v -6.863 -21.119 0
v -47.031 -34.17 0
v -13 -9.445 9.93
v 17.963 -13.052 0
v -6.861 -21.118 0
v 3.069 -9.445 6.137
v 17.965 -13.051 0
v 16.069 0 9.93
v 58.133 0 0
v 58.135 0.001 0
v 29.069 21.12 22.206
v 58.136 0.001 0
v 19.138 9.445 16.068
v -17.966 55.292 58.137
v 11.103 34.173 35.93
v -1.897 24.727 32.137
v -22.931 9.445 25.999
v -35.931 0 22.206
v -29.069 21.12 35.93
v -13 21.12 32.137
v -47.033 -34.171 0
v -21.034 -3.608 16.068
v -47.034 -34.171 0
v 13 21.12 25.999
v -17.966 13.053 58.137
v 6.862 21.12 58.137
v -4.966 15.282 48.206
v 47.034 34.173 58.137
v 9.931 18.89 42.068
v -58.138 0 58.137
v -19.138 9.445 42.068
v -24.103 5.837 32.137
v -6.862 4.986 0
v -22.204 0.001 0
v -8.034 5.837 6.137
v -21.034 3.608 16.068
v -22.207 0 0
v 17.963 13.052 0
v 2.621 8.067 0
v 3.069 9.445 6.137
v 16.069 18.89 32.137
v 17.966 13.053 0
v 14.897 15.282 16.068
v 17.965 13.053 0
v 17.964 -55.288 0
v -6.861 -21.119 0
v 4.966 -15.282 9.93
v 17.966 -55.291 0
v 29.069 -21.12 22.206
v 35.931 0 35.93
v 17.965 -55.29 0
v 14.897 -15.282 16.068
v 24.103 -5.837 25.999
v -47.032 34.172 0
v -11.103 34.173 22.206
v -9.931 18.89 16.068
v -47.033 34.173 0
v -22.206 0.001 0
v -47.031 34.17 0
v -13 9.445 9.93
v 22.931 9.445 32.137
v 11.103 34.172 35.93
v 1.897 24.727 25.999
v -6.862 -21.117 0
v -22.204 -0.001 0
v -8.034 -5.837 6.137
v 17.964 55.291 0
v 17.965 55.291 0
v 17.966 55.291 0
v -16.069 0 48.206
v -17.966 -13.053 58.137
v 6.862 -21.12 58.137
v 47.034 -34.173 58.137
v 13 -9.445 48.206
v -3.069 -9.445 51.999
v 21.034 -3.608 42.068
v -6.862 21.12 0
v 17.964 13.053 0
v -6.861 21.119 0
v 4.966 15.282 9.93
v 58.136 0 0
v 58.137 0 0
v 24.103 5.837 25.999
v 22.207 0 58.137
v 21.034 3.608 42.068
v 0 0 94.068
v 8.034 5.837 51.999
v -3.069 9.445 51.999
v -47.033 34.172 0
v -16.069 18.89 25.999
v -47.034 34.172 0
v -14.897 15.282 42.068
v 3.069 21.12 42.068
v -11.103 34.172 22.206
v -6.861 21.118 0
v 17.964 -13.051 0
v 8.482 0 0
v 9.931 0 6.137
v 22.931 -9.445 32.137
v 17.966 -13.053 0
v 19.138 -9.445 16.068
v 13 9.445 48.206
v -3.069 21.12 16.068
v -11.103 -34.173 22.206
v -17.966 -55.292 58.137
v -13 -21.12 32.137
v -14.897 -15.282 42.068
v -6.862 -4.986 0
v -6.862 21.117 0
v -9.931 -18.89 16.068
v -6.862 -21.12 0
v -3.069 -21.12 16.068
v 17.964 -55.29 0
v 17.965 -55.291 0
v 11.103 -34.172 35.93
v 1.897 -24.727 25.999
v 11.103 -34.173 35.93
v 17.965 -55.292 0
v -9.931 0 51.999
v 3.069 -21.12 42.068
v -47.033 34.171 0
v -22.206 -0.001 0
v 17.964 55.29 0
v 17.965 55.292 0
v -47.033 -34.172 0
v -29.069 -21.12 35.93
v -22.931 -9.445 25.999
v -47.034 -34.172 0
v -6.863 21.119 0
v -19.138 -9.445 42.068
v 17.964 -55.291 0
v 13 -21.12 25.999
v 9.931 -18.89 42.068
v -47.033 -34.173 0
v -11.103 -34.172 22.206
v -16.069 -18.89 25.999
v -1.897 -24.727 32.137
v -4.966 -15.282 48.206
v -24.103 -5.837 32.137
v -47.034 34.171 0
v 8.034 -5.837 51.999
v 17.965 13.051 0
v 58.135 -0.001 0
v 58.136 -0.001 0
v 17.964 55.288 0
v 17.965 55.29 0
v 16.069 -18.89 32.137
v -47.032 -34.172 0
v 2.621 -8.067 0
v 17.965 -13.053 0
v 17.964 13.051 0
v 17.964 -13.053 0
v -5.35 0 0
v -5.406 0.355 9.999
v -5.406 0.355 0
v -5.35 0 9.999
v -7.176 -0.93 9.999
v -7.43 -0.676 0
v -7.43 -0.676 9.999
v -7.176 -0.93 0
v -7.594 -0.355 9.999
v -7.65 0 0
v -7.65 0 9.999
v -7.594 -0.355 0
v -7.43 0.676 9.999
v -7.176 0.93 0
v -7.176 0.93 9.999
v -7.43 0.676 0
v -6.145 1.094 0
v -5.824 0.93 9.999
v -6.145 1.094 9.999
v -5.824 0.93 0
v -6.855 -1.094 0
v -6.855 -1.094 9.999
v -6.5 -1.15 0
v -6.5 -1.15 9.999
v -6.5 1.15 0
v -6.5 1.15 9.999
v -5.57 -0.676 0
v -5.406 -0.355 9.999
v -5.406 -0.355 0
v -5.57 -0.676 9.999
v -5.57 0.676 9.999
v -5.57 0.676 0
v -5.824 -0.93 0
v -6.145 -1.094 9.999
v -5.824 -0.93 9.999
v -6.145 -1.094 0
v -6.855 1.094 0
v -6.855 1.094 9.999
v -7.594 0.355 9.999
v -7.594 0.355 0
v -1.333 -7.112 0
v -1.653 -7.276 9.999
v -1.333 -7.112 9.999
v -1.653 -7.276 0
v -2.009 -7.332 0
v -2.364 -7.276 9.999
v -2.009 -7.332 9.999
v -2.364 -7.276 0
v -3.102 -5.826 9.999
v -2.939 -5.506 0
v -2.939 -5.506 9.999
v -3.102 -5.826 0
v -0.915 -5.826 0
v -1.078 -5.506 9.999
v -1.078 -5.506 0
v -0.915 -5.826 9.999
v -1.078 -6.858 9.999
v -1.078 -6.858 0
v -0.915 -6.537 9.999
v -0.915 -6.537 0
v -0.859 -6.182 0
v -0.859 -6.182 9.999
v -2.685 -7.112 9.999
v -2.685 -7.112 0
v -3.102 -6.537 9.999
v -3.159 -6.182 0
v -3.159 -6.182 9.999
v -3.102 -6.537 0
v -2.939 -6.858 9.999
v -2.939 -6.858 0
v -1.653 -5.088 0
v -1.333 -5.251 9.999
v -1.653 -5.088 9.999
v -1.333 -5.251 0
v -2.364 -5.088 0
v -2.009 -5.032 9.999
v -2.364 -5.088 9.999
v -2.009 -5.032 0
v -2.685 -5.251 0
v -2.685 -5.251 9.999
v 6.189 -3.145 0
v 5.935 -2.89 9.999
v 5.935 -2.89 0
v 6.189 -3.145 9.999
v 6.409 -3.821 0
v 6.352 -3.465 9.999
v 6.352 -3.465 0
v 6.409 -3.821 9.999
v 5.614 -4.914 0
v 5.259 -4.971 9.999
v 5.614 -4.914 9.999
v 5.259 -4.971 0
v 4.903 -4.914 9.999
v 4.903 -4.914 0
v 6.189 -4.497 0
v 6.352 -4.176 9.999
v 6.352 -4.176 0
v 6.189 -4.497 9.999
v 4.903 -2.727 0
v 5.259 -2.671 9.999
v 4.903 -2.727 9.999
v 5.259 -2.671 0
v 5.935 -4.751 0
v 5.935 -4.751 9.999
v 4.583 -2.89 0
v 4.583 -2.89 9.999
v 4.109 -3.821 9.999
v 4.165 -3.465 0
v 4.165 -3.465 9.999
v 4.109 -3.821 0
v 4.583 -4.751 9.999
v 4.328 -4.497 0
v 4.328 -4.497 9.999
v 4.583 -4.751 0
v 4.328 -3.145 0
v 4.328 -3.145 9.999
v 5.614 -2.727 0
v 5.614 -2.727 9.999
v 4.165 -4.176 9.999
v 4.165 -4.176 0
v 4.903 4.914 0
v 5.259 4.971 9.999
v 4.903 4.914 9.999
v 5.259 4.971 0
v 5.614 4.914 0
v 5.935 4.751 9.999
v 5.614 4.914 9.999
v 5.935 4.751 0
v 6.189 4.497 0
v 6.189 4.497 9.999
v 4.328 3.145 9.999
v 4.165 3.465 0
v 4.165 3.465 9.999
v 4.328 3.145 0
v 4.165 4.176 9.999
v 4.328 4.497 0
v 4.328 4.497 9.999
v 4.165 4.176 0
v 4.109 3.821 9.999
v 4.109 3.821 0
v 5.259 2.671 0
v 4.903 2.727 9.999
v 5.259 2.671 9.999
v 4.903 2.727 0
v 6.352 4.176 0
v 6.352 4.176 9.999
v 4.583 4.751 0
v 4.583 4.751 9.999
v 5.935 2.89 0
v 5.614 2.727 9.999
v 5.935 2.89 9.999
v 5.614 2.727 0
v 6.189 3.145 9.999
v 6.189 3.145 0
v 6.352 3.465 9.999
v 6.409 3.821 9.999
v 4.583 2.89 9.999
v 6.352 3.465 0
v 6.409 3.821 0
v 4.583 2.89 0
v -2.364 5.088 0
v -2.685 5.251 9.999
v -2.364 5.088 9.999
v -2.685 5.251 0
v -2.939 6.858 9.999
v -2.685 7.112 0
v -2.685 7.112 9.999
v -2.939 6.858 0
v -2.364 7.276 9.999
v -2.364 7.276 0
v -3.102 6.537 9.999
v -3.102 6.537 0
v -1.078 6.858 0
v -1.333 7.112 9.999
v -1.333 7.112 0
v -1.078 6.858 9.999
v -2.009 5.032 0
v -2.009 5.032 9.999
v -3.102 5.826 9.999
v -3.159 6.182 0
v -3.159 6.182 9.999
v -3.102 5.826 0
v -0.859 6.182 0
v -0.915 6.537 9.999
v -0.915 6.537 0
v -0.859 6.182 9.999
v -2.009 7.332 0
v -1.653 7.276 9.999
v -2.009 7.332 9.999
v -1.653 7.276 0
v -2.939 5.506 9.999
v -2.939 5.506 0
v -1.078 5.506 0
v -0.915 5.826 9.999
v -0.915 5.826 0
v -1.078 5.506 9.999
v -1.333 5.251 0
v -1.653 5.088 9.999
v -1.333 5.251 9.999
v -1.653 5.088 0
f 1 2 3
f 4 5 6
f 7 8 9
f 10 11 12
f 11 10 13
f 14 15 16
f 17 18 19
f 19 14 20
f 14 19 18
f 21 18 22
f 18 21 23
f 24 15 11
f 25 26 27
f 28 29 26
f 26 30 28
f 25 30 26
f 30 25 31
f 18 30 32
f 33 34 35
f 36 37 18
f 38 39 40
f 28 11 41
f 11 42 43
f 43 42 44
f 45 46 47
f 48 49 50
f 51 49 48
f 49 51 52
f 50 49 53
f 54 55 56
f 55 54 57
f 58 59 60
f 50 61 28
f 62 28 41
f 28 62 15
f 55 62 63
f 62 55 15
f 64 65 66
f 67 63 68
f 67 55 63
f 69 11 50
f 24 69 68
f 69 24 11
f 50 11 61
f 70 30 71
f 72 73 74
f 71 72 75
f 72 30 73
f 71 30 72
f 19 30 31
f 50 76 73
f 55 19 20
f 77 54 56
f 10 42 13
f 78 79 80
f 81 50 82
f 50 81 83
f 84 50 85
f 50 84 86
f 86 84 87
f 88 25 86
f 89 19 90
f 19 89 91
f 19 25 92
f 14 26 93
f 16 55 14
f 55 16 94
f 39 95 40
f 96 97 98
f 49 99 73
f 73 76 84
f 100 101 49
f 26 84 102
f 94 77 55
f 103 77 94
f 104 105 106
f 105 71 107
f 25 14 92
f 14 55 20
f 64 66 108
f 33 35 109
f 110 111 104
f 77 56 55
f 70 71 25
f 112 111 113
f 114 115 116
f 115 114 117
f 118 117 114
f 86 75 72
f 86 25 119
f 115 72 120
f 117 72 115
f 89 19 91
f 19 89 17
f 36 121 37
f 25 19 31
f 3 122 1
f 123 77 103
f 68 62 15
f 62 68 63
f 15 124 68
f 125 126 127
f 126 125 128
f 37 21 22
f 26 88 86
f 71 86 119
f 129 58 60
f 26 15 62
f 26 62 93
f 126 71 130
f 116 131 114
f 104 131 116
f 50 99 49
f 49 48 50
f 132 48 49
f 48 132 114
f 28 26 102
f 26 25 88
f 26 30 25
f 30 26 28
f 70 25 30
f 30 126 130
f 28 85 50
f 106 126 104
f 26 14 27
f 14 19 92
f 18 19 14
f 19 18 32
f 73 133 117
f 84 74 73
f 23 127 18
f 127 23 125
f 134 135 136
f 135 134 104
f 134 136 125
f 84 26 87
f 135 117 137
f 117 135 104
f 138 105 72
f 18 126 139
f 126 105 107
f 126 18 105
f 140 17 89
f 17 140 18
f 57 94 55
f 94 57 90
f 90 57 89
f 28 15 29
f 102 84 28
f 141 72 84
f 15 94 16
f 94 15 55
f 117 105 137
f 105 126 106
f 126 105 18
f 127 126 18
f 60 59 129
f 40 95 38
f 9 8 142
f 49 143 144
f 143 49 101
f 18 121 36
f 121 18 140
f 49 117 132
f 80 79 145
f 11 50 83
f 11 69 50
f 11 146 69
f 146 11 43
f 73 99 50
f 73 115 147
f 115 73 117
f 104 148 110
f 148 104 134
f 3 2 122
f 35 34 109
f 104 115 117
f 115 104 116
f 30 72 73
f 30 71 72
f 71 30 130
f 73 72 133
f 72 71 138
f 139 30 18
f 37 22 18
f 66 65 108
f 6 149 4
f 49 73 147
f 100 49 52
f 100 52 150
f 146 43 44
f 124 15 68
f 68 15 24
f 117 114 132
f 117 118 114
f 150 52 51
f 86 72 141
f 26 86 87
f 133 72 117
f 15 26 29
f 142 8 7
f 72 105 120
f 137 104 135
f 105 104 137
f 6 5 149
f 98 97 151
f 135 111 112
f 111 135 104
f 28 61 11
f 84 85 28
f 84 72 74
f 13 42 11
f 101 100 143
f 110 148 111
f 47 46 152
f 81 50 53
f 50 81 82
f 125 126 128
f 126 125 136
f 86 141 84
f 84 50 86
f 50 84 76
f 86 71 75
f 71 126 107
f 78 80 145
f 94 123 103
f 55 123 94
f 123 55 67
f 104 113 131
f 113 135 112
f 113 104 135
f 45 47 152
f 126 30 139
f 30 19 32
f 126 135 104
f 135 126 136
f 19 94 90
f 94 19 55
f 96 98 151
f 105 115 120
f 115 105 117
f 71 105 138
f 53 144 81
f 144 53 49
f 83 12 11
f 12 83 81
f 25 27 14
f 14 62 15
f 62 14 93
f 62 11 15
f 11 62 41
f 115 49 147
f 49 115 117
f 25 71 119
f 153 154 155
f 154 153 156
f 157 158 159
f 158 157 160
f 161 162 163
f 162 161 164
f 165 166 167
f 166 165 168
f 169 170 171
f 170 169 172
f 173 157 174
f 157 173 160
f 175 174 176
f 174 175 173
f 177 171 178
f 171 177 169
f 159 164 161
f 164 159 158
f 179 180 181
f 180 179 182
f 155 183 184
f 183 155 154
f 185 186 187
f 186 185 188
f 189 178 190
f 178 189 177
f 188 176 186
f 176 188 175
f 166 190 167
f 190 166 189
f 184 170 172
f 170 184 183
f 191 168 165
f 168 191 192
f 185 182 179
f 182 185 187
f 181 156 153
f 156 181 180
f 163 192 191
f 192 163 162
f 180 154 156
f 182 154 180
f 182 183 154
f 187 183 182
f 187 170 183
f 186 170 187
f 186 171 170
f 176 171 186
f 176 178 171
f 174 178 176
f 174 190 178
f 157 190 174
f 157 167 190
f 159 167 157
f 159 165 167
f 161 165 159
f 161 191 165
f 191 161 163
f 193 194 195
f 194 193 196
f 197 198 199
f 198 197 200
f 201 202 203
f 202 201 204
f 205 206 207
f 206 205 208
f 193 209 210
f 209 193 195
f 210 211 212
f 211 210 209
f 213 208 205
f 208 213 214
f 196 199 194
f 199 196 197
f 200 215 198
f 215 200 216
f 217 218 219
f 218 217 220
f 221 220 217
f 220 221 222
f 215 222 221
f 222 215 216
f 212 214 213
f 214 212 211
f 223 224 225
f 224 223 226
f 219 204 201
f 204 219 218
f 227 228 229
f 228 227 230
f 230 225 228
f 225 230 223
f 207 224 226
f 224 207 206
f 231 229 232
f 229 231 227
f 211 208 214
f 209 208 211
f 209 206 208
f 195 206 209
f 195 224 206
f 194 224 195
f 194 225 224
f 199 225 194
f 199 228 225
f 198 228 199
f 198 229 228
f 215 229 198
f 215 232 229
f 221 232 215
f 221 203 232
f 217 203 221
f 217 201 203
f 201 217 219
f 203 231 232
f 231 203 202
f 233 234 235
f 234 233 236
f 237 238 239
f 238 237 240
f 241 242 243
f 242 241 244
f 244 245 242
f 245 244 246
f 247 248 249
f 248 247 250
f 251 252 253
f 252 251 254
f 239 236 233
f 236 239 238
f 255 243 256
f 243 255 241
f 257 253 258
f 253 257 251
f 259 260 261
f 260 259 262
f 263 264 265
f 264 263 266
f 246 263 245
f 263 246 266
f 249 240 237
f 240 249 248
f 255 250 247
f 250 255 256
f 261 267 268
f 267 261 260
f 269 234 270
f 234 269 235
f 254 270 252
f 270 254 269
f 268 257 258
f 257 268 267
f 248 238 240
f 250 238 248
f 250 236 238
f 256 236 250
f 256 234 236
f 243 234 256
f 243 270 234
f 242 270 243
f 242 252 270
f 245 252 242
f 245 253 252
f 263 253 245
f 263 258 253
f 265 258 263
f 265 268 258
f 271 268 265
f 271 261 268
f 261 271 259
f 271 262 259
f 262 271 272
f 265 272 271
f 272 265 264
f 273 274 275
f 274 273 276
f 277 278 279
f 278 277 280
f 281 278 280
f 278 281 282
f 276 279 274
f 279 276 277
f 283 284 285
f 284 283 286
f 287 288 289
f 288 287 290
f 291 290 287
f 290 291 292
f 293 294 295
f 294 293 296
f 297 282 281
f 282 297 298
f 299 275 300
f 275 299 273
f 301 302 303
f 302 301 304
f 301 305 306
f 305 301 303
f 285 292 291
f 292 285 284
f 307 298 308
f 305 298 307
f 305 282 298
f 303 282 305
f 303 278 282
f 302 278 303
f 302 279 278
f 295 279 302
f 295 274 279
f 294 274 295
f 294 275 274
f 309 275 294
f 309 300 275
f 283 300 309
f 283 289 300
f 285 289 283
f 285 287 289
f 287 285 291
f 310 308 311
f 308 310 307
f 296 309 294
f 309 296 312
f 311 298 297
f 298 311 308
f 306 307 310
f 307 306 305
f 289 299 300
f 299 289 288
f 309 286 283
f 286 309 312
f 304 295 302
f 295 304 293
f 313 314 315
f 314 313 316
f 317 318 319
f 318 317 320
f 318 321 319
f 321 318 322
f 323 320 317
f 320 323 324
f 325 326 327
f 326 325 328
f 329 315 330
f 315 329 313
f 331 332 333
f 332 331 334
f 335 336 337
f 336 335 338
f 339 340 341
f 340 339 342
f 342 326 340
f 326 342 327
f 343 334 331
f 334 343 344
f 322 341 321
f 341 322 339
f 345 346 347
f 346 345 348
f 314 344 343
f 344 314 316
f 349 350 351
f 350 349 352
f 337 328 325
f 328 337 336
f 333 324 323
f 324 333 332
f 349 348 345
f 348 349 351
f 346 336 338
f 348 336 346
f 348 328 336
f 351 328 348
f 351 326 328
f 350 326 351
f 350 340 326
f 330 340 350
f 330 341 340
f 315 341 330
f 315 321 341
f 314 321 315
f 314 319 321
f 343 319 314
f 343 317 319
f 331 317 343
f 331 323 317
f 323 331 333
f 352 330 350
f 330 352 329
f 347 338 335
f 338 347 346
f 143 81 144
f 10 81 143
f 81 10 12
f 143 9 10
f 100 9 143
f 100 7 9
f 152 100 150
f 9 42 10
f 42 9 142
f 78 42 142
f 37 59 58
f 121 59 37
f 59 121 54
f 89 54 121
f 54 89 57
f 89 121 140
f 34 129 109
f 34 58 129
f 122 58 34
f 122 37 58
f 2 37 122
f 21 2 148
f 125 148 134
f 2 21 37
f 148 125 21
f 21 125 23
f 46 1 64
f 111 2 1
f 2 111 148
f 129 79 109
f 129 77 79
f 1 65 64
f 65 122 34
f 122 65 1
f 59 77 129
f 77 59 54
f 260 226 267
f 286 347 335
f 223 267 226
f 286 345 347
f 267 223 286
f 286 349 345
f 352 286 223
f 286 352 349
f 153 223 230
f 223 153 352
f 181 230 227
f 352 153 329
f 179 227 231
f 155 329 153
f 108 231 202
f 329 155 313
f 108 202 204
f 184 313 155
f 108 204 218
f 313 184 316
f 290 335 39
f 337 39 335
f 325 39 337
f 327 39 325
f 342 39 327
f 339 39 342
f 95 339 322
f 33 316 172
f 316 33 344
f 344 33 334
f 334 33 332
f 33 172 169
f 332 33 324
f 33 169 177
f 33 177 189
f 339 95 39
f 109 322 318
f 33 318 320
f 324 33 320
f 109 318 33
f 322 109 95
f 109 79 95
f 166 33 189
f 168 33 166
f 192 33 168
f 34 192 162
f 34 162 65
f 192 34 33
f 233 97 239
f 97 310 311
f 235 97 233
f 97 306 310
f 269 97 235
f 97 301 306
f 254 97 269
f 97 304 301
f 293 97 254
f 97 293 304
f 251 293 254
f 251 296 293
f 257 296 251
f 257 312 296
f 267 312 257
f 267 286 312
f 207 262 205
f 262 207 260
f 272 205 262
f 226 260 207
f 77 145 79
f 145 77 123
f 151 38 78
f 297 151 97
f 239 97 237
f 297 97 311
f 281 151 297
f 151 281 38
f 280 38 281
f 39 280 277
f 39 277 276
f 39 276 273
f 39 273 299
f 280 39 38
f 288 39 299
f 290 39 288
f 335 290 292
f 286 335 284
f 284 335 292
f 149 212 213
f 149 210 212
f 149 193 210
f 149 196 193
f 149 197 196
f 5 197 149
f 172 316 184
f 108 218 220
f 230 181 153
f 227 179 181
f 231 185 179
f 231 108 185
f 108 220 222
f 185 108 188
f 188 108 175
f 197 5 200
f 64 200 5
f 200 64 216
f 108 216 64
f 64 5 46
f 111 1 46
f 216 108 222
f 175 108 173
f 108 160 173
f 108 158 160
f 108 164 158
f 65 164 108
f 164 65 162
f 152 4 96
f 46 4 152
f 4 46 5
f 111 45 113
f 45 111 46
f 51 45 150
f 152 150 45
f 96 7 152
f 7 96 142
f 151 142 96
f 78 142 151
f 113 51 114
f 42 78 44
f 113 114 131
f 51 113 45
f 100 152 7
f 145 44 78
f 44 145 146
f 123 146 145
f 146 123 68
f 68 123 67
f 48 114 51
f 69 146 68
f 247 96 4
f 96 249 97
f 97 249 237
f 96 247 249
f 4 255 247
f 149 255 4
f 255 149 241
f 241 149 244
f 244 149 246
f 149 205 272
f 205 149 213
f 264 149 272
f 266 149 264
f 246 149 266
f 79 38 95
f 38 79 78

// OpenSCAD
gold = (1 + sqrt(5)) / 2;
// 0 = raw object, 1... = printable, 10 = stand.
piece = 1;

c7();

radius = 65; // * (1+2*gold) / 2.3839634168752983;

// When slicing, remove this much extra in the z direction.
extra_z_remove=0.0;

$fn=20;

// By default ($retrograde == false), we assume that the object has no caves or
// hollows, so that it is safe to extend components towards (and just beyond),
// the center.
//
// Because we build the part out of surfaces, this makes it easier to extend a
// surface to a 3d part.
//
// $retrograde needs to be set where there are caves or hollows.
$retrograde = false;
$pimple = 0.01;

function mirror(p) = [p.x, p.z, p.y];
function pls(p) = [p.z, p.x, p.y];
function mns(p) = [p.y, p.z, p.x];

function sum(v, n) = n + 1 < len(v) ? v[n] + sum(v, n + 1) : v[n];

// Center of a face.
p0 = [1, 1, 1] / 3;

//1	0	0	6	1
p1 = [1, 0, 0];
radius1 = 1;

//0.4+0.2ϕ	0.4+0.2ϕ	0.2-0.4ϕ	1	0.2+0.6ϕ
p2 = [2 + gold, 2 + gold, 1 - 2 * gold] / 5;
radius2 = 1.0661408512011674;

//0.5+0.5ϕ	-0.5ϕ	0.5	3	(1+ϕ)/√2
p3a = [1 + gold, 1, -gold] / 2;
p3b = mirror(p3a);
radius3 = 1.3763819204711734;

//1	1	-1	1	2
p4 = [1, 1, -1];
radius4 = 1.451059202444919;

//1ϕ	1-1ϕ	0	1	2
p4a = [gold, 0, 1 - gold];
p4b = mirror(p4a);

//0.6+0.8ϕ	0.2-0.4ϕ	0.2-0.4ϕ	1	0.4+1.2ϕ
p5 = [3 + 4 * gold, 1 - 2 * gold, 1 - 2 * gold] / 5;
radius5 = 1.6285570507046667;

//0.8+0.4ϕ	-0.2-0.6ϕ	0.4+0.2ϕ	1	0.4+1.2ϕ
p5a = [4 + 2 * gold, 2 + gold, -1 - 3*gold] / 5;
p5b = mirror(p5a);

// 1+1ϕ	-1ϕ	0	10	(1+ϕ)√2
// Six planes meet.
p6a = [1 + gold, 0, -gold];
p6b = mirror(p6a);
radius6 = 2.3839634168752983;

// -1-2ϕ	1+1ϕ	1+1ϕ	6	2+3ϕ
// Five planes meet.
p7 = [1 + gold, 1 + gold, -1 - 2 * gold];
radius7 = 1 + 2 * gold;

//-2-4ϕ	2+3ϕ	1+1ϕ	1	4+6ϕ
// Six of nine.
p8a = [2 + 3 * gold, 1 + gold, -2 - 4 * gold];
p8b = mirror(p8a);
radius8 = 8.359584944780256;

// 3+4ϕ	-1-2ϕ	-1-2ϕ	1	4+6ϕ
// Three of nine.
p8 = [3 + 4 * gold, -1 - 2 * gold, -1 - 2 * gold];

function apply(tri, p) = tri[0] * p[0] + tri[1] * p[1] + tri[2] * p[2];

module wedge(tri, stellation) {
    d = stellation[1] - stellation[0];
    e = stellation[2] - stellation[1];
    cross_sum = d.y * e.z - d.z * e.y
        +       d.z * e.x - d.x * e.z
        +       d.x * e.y - d.y * e.x;

    midpoint = sum(stellation, 0) / len(stellation);
    anchor_n = -0.01 * midpoint;
    anchor_r = midpoint - $pimple * sign(cross_sum) * [1, 1, 1];
    anchor = $retrograde ? anchor_r : anchor_n;

    points = [
        apply(tri, anchor),
        for (p = stellation) apply(tri, p),
        ];
    faces = [
        [each [1:len(stellation)]],
        [1, len(stellation), 0],
        for (i = [2:len(stellation)]) [i, i-1, 0],
        ];
    if (cross_sum >= 0)
        polyhedron(points = points, faces = faces, convexity=10);
    else
        color("red") polyhedron(points = points, faces = faces, convexity=2);
    // # for (p = stellation) translate(apply(tri, p)) sphere(0.1);
    //% translate(anchor) sphere(0.1);
}

module wedges(tri, stellations) {
    for (s = stellations) wedge(tri, s);
}

ico_scale = sqrt(6 + 3 * gold);

function polar(r, theta, z) = [r * cos(theta), r * sin(theta), z] / ico_scale;

function A(i) = polar(       2, i*120,     -gold - 1);
function B(i) = polar(gold * 2, i*120 + 60, 1 - gold);
function C(i) = polar(gold * 2, i*120,      gold - 1);
function D(i) = polar(       2, i*120 + 60, gold + 1);

module stellate_sym(stellations) {
    wedges([A(0), A(1), A(2)], stellations);

    for (i = [0:2]) {
        wedges([A(i+1), A(i  ), B(i  )], stellations);
        wedges([A(i+1), B(i  ), C(i+1)], stellations);
        wedges([C(i  ), B(i  ), A(i  )], stellations);

        wedges([D(i  ), D(i+1), C(i+1)], stellations);
        wedges([D(i  ), C(i+1), B(i  )], stellations);
        wedges([B(i  ), C(i  ), D(i  )], stellations);
    }

    wedges([D(2), D(1), D(0)], stellations);
}

module stellate(stellations) {
    stellate_sym([ for (s = stellations) each triple(s) ]);
}

function triple(stellation) = [
    stellation,
    [ for (p = stellation) pls(p) ],
    [ for (p = stellation) mns(p) ],
    ];

module full_A() stellate_sym([[p1, pls(p1), mns(p1)]]);

module full_B() stellate_sym(
    [[p1, p2, pls(p1), pls(p2), mns(p1), mns(p2)]]);

module full_C() stellate_sym(
    [[p3a, pls(p3a), mns(p3a)],
     [p3b, pls(p3b), mns(p3b)]]);

module full_D() stellate([[mns(p1), p4a, p4, pls(p4b)]]);

module full_E() stellate(
    [[mns(p2), p5a, pls(p5), mns(p5b)],
     [p6a, pls(p1), mns(p6b)],
        ]);

module full_F() stellate_sym(
    [[p6a, pls(p6a), mns(p6a)],
     [p6b, pls(p6b), mns(p6b)],
     each triple([p1, p7, pls(p1), mns(p1)]),
        ]);

module full_G() stellate_sym([[p7, pls(p7), mns(p7)]]);

module full_H() stellate(
    [[p8, p6a, p6b],
     [p8a, p7, p6a],
     [p8b, p6b, mns(p7)],
        ]);

module cell_e1() {
    $retrograde = true;
    stellate(
        [[p3a, p4a, p6a],
         [p6b, p4b, p3b],
         [p4, p3a, p2, pls(p3b)],
            ]);
}

module cell_f1a() {
    $retrograde = true;
    stellate(
        [[p6a, p5a, p3a],
         [p4a, p5, p6a],

         [p3b, p4b, p6b],
         [p5b, mns(p4), p3b],
            ]);
}

module cell_f1b() {
    $retrograde = true;
    stellate(
        [[p6a, p4a, p3a],
         [p3a, p4, p5a],
         [p6b, p5, p4b],
         [p3b, p5b, p6b],
            ]);
}

module cell_g1() {
    $retrograde = true;
    stellate(
        [[p6a, p5, p6b],
         [p3a, p5a, p6a],
         [p6b, p5b, p3b],
            ]);
}

module cell_e2() {
    $retrograde = true;
    stellate_t
        ([
            [p1, p4b, p5, p4a],
            [p1, p3a, p4a],
            [p4b, p3b, p1],
            [p5a, p4, p3a],
            [p3b, mns(p4), p5b],
            ]);
}

module cell_f2() {
    $retrograde = true;
    stellate
        ([
            [p4, p5a, p7, pls(p5b)],
            [p1, p4a, p5, p4b],
            ]);
}

module cell_g2() {
    $retrograde = true;
    stellate
        ([
            [p5a, p6a, p7],
            [mns(p7), p6b, p5b],
            [p7, p5a, p4, pls(p5b)],
            [p6a, p5, p4a],
            [p4b, p5, p6b],
            ]);
}

module c1() full_A();                   // Icosohedron.

module c2() full_B();             // Small triambic / first stellation / triakis

module c3() full_C();                   // Compound five octohedra

module c4() full_D();

module c5() full_E();

module c6() full_F();                   // Second stellation.

module c7()                             // Great.
    dodeca_spikey(post=-0.1) full_G();

module c8()                             // The mighty final stellation.
    icoso_top_bottom(radius8, spoke=-0.5, inset=5) full_H();

module c9() cell_e1();               // Twelfth stellation, spikes point joined.

module c10() {                          // Hex spike cage, face joins.
    cell_f1a();
    cell_f1b();
}

module c11() cell_g1();                 // Fourth stellation, point join.

module c12() {                          // Hex spike cage.
    cell_e1();
    cell_f1a();
    cell_f1b();
}

module c13() {                          // Dodec cage.
    cell_e1();
    cell_f1a();
    cell_f1b();
    cell_g1();
}

module c14() {                          // Dodec cage.
    cell_f1a();
    cell_f1b();
    cell_g1();
}

module c15() cell_e2();                 // Quint dimples, point join.

module c16() cell_f2();                 // Quint spikes, floating.

module c17() cell_g2();                 // Hex spikes, joined by points.

module c18() {                          // Quint spikes joined by points.
    cell_e2();
    cell_f2();
}

module c19() {                          // Hex spikes joined by points.
    cell_e2();
    cell_f2();
    cell_g2();
}

module c20() {                    // Fifth stellation, star spikes, point joins.
    cell_f2();
    cell_g2();
}

module c21() {                          // Seventh stellation, 20 hex spikes.
    full_D();
    cell_e1();
}

module c22() {                          // Ten tetrahedra.
    full_E();
    cell_f1a();
    cell_f1b();
}

module c23()                      // Sixth stellation.  Exc. dodec with spikes.
    dodeca_spikey() stellate([[pls(p7), p6b, p6a]]);    // F g1

module c24() {                          // Ten tetra, hollowed.
    full_D();
    cell_e1();
    cell_f1a();
    cell_f1b();
}

module c25() {                          // Sunken centers of exc. docec.
    full_D();
    cell_e1();
    cell_f1();
    cell_g1();
}

module c26()                            // Excavated dodec.
    dodeca_single(radius6) stellate([[p6a, p1, p6b]]); // E f1 g1

module c27() {                          // Excavated turrets.
    full_D();
    cell_e2();
}

module c28() {                          // Twelve big spikes, twenty small.
    full_E();
    cell_f2();
}

module c29() {          // Eighth stellation, great with mid-edge removed.
    full_F();
    cell_g2();
}

module c30()                    // Great triambic / medial triambic icosohedron.
    stellate([[p2, p3a, p7, pls(p3b)]]); // D e2 f2.

module c31() {                          // c29 but hollow.
    full_D();
    cell_e2();
    cell_f2();
    cell_g2();
}

module c32() {                          // c29 but hollow.
    full_E();
    cell_f2();
    cell_g2();
}

module c33() cell_f1a();                // Tenth stellation

module c34() {                          // Eleventh stellation, point touch.
    cell_e1();
    cell_f1a();
}

module c35() {                          // Quint cube with chunks removed.
    full_D();
    cell_e1();
    cell_f1a();
}

module c36() {                          // Only points touch.
    cell_f1a();
    cell_g1();
}

module c37() {                          // Fourteenth stellation, dodec cage.
    cell_e1();
    cell_f1a();
    cell_g1();
}

module c38() {                          // Exc. dodec with chunks out.
    full_D();
    cell_e1();
    cell_f1a();
    cell_g1();
}

module c39() {                          // Dodec cage, point join.
    cell_f1a();
    cell_g1();
}

module c40() {                          // Twelve hex spikes, hollow.
    cell_e1();
    cell_f1a();
    cell_g2();
}

module c41() {                          // Twelve hex spikes, chunks out.
    full_D();
    cell_e1();
    cell_f1a();
    cell_g2();
}

module c42() {                          // Hex spikes, point join.
    cell_f1a();
    cell_f2();
    cell_g2();
}

module c43() {                          // Hex spikes, hollow.
    cell_e1();
    cell_f1a();
    cell_f2();
    cell_g2();
}

module c44() {                          // Hex spikes, chunks out.
    full_D();
    cell_e1();
    cell_f1a();
    cell_f2();
    cell_g2();
}

module c45() {                          // Fifteenth stellation
    cell_e2();
    cell_f1a();
}

module c46() {                          // Hollow hex spikes, solid support.
    full_D();
    cell_e2();
    cell_f1a();
}

// E f1
module c47()
    icoso_top_bottom(radius6, spoke=-0.94, inset=18, jangle=36.4)
    stellate_sym([[p6a, pls(p6a), mns(p6a)]]); // Five tetrahedra.

module c48() {                          // Hollowed chiral exc. dodec.
    cell_e2();
    cell_f1a();
    cell_g1();
}

module c49() {                          // Exc. dodec, hollow spikes, solid.
    full_D();
    cell_e2();
    cell_f1a();
    cell_g1();
}

module c50() {                          // Exc. dodec, chiral chunks out.
    full_E();
    cell_f1a();
    cell_g1();
}

module c51() {                          // Thirteenth stellation
    cell_e2();                          // Spikes with crazy point joins.
    cell_f1a();
    cell_f2();
}

module c52() {                          // 12 + 20 spikes, some hollow.
    full_D();
    cell_e2();
    cell_f1a();
    cell_f2();
}

module c53() {                          // No retro, crazy!
    full_E();
    cell_f1a();
    cell_f2();
}

module c54() {                          // Spikes with joiners.
    cell_e2();
    cell_f1a();
    cell_f2();
    cell_g1();
}

module c55() {                          //12 + 20 spikes, some hollow.
    full_D();
    cell_e2();
    cell_f1a();
    cell_f2();
    cell_g1();
}

module c56() {                          // Chiral exc. dodec with spikes.
    full_E();
    cell_f1a();
    cell_f2();
    cell_g1();
}

module c57() {                          // Hex spikes, point join.
    cell_e2();
    cell_f1a();
    cell_f2();
    cell_g2();
}

module c58() {                          // Hex spikes, crossed-edge join.
    full_D();
    cell_e2();
    cell_f1a();
    cell_f2();
    cell_g2();
}

module c59() {                          // Hex spikes, chunks out.
    full_E();
    cell_f1a();
    cell_f2();
    cell_g2();
}

module dodeca_single(raw_radius) {
    if (piece == 0) {
        children();
    }
    else if (piece == 1) {
        difference() {
            translate([0,0,-extra_z_remove])
                dodeca_pointup(raw_radius) children();
            if (extra_z_remove > 0)
                translate([0,0,-1.1 * radius]) cube(2.2 * radius, center=true);
        }
    }
}

module dodeca_spikey(post=0.1, inset=0) {
    echo("RCL", post);
    if (piece == 0) {
        children();
    }
    else if (piece == 1) {
        difference() {
            translate([0,0,-1e-3 - extra_z_remove])
                dodeca_pointup(radius7, post=post, inset=inset) children();
            translate([0,0,-1.1 * radius]) cube(2.2 * radius, center=true);
        }
    }
    else if (piece == 2) {
        difference() {
            translate([0,0,-1e-3 - extra_z_remove]) rotate([0,180,0])
                dodeca_pointup(radius7, post=post, inset=inset) children();
            translate([0,0,-1.1 * radius]) cube(2.2 * radius, center=true);
        }
    }
}

module icoso_top_bottom(raw_radius, spoke=0, inset=5, jangle=0) {
    if (piece == 0) {
        children();
    }
    else if (piece == 1) {
        difference() {
            translate([0, 0, -1e-5])
                icoso_tb_whole(raw_radius, spoke, inset, jangle)
                children();
            translate([0, 0, -radius * 1.1]) cube(radius * 2.2, center=true);
        }
    }
    else if (piece == 2) {
        difference() {
            translate([0, 0, -1e-5]) rotate([0,180,0])
                icoso_tb_whole(raw_radius, spoke, inset, jangle)
                children();
            translate([0,0, -radius * 1.1]) cube(radius * 2.2, center=true);
        }
    }
}

module icoso_tb_whole(raw_radius, spoke, inset, jangle) {
    offset = (1 + gold) / ico_scale;
    difference() {
        scale(radius / raw_radius)
            translate([0, 0, offset]) children();
        if (spoke != 0) {                    // Spoke joiners.
            for (i = [0:2])
                rotate(120 * i + jangle)
                    rotate([0, 90 * sign(spoke), 0]) cylinder(
                    r=1.1, h=abs(spoke) * radius - inset);
        }
    }
}

// Rotate so an icoshedral point is upwards.
module pointup() {
    c = 2 / sqrt(3 * gold + 6);
    s = (gold + 1) / sqrt(3 * gold + 6);
    multmatrix([[s, 0, c, 0], [0, 1, 0, 0], [-c, 0, s, 0]]) children();
}

// Position so the 6a, 6b dodecahedron is resting on the x-y plane.
module dodeca_pointup(raw_radius, post, inset) {
    c = 2 / sqrt(3 * gold + 6);
    s = (gold + 1) / sqrt(3 * gold + 6);
    echo(post)
    difference() {
        scale(radius / raw_radius)
            multmatrix([[s, 0, c, 0], [0, 1, 0, 0], [-c, 0, s, s * radius6]])
            children();
        if (post != 0) {
            for (i = [0:4]) {
                rotate(72 * i + 90 * sign(post) - 90)
                    translate([abs(post) * radius, 0, 0])
                    # cylinder(r=1.15, h=20, center=true);
            }
        }
    }
}
